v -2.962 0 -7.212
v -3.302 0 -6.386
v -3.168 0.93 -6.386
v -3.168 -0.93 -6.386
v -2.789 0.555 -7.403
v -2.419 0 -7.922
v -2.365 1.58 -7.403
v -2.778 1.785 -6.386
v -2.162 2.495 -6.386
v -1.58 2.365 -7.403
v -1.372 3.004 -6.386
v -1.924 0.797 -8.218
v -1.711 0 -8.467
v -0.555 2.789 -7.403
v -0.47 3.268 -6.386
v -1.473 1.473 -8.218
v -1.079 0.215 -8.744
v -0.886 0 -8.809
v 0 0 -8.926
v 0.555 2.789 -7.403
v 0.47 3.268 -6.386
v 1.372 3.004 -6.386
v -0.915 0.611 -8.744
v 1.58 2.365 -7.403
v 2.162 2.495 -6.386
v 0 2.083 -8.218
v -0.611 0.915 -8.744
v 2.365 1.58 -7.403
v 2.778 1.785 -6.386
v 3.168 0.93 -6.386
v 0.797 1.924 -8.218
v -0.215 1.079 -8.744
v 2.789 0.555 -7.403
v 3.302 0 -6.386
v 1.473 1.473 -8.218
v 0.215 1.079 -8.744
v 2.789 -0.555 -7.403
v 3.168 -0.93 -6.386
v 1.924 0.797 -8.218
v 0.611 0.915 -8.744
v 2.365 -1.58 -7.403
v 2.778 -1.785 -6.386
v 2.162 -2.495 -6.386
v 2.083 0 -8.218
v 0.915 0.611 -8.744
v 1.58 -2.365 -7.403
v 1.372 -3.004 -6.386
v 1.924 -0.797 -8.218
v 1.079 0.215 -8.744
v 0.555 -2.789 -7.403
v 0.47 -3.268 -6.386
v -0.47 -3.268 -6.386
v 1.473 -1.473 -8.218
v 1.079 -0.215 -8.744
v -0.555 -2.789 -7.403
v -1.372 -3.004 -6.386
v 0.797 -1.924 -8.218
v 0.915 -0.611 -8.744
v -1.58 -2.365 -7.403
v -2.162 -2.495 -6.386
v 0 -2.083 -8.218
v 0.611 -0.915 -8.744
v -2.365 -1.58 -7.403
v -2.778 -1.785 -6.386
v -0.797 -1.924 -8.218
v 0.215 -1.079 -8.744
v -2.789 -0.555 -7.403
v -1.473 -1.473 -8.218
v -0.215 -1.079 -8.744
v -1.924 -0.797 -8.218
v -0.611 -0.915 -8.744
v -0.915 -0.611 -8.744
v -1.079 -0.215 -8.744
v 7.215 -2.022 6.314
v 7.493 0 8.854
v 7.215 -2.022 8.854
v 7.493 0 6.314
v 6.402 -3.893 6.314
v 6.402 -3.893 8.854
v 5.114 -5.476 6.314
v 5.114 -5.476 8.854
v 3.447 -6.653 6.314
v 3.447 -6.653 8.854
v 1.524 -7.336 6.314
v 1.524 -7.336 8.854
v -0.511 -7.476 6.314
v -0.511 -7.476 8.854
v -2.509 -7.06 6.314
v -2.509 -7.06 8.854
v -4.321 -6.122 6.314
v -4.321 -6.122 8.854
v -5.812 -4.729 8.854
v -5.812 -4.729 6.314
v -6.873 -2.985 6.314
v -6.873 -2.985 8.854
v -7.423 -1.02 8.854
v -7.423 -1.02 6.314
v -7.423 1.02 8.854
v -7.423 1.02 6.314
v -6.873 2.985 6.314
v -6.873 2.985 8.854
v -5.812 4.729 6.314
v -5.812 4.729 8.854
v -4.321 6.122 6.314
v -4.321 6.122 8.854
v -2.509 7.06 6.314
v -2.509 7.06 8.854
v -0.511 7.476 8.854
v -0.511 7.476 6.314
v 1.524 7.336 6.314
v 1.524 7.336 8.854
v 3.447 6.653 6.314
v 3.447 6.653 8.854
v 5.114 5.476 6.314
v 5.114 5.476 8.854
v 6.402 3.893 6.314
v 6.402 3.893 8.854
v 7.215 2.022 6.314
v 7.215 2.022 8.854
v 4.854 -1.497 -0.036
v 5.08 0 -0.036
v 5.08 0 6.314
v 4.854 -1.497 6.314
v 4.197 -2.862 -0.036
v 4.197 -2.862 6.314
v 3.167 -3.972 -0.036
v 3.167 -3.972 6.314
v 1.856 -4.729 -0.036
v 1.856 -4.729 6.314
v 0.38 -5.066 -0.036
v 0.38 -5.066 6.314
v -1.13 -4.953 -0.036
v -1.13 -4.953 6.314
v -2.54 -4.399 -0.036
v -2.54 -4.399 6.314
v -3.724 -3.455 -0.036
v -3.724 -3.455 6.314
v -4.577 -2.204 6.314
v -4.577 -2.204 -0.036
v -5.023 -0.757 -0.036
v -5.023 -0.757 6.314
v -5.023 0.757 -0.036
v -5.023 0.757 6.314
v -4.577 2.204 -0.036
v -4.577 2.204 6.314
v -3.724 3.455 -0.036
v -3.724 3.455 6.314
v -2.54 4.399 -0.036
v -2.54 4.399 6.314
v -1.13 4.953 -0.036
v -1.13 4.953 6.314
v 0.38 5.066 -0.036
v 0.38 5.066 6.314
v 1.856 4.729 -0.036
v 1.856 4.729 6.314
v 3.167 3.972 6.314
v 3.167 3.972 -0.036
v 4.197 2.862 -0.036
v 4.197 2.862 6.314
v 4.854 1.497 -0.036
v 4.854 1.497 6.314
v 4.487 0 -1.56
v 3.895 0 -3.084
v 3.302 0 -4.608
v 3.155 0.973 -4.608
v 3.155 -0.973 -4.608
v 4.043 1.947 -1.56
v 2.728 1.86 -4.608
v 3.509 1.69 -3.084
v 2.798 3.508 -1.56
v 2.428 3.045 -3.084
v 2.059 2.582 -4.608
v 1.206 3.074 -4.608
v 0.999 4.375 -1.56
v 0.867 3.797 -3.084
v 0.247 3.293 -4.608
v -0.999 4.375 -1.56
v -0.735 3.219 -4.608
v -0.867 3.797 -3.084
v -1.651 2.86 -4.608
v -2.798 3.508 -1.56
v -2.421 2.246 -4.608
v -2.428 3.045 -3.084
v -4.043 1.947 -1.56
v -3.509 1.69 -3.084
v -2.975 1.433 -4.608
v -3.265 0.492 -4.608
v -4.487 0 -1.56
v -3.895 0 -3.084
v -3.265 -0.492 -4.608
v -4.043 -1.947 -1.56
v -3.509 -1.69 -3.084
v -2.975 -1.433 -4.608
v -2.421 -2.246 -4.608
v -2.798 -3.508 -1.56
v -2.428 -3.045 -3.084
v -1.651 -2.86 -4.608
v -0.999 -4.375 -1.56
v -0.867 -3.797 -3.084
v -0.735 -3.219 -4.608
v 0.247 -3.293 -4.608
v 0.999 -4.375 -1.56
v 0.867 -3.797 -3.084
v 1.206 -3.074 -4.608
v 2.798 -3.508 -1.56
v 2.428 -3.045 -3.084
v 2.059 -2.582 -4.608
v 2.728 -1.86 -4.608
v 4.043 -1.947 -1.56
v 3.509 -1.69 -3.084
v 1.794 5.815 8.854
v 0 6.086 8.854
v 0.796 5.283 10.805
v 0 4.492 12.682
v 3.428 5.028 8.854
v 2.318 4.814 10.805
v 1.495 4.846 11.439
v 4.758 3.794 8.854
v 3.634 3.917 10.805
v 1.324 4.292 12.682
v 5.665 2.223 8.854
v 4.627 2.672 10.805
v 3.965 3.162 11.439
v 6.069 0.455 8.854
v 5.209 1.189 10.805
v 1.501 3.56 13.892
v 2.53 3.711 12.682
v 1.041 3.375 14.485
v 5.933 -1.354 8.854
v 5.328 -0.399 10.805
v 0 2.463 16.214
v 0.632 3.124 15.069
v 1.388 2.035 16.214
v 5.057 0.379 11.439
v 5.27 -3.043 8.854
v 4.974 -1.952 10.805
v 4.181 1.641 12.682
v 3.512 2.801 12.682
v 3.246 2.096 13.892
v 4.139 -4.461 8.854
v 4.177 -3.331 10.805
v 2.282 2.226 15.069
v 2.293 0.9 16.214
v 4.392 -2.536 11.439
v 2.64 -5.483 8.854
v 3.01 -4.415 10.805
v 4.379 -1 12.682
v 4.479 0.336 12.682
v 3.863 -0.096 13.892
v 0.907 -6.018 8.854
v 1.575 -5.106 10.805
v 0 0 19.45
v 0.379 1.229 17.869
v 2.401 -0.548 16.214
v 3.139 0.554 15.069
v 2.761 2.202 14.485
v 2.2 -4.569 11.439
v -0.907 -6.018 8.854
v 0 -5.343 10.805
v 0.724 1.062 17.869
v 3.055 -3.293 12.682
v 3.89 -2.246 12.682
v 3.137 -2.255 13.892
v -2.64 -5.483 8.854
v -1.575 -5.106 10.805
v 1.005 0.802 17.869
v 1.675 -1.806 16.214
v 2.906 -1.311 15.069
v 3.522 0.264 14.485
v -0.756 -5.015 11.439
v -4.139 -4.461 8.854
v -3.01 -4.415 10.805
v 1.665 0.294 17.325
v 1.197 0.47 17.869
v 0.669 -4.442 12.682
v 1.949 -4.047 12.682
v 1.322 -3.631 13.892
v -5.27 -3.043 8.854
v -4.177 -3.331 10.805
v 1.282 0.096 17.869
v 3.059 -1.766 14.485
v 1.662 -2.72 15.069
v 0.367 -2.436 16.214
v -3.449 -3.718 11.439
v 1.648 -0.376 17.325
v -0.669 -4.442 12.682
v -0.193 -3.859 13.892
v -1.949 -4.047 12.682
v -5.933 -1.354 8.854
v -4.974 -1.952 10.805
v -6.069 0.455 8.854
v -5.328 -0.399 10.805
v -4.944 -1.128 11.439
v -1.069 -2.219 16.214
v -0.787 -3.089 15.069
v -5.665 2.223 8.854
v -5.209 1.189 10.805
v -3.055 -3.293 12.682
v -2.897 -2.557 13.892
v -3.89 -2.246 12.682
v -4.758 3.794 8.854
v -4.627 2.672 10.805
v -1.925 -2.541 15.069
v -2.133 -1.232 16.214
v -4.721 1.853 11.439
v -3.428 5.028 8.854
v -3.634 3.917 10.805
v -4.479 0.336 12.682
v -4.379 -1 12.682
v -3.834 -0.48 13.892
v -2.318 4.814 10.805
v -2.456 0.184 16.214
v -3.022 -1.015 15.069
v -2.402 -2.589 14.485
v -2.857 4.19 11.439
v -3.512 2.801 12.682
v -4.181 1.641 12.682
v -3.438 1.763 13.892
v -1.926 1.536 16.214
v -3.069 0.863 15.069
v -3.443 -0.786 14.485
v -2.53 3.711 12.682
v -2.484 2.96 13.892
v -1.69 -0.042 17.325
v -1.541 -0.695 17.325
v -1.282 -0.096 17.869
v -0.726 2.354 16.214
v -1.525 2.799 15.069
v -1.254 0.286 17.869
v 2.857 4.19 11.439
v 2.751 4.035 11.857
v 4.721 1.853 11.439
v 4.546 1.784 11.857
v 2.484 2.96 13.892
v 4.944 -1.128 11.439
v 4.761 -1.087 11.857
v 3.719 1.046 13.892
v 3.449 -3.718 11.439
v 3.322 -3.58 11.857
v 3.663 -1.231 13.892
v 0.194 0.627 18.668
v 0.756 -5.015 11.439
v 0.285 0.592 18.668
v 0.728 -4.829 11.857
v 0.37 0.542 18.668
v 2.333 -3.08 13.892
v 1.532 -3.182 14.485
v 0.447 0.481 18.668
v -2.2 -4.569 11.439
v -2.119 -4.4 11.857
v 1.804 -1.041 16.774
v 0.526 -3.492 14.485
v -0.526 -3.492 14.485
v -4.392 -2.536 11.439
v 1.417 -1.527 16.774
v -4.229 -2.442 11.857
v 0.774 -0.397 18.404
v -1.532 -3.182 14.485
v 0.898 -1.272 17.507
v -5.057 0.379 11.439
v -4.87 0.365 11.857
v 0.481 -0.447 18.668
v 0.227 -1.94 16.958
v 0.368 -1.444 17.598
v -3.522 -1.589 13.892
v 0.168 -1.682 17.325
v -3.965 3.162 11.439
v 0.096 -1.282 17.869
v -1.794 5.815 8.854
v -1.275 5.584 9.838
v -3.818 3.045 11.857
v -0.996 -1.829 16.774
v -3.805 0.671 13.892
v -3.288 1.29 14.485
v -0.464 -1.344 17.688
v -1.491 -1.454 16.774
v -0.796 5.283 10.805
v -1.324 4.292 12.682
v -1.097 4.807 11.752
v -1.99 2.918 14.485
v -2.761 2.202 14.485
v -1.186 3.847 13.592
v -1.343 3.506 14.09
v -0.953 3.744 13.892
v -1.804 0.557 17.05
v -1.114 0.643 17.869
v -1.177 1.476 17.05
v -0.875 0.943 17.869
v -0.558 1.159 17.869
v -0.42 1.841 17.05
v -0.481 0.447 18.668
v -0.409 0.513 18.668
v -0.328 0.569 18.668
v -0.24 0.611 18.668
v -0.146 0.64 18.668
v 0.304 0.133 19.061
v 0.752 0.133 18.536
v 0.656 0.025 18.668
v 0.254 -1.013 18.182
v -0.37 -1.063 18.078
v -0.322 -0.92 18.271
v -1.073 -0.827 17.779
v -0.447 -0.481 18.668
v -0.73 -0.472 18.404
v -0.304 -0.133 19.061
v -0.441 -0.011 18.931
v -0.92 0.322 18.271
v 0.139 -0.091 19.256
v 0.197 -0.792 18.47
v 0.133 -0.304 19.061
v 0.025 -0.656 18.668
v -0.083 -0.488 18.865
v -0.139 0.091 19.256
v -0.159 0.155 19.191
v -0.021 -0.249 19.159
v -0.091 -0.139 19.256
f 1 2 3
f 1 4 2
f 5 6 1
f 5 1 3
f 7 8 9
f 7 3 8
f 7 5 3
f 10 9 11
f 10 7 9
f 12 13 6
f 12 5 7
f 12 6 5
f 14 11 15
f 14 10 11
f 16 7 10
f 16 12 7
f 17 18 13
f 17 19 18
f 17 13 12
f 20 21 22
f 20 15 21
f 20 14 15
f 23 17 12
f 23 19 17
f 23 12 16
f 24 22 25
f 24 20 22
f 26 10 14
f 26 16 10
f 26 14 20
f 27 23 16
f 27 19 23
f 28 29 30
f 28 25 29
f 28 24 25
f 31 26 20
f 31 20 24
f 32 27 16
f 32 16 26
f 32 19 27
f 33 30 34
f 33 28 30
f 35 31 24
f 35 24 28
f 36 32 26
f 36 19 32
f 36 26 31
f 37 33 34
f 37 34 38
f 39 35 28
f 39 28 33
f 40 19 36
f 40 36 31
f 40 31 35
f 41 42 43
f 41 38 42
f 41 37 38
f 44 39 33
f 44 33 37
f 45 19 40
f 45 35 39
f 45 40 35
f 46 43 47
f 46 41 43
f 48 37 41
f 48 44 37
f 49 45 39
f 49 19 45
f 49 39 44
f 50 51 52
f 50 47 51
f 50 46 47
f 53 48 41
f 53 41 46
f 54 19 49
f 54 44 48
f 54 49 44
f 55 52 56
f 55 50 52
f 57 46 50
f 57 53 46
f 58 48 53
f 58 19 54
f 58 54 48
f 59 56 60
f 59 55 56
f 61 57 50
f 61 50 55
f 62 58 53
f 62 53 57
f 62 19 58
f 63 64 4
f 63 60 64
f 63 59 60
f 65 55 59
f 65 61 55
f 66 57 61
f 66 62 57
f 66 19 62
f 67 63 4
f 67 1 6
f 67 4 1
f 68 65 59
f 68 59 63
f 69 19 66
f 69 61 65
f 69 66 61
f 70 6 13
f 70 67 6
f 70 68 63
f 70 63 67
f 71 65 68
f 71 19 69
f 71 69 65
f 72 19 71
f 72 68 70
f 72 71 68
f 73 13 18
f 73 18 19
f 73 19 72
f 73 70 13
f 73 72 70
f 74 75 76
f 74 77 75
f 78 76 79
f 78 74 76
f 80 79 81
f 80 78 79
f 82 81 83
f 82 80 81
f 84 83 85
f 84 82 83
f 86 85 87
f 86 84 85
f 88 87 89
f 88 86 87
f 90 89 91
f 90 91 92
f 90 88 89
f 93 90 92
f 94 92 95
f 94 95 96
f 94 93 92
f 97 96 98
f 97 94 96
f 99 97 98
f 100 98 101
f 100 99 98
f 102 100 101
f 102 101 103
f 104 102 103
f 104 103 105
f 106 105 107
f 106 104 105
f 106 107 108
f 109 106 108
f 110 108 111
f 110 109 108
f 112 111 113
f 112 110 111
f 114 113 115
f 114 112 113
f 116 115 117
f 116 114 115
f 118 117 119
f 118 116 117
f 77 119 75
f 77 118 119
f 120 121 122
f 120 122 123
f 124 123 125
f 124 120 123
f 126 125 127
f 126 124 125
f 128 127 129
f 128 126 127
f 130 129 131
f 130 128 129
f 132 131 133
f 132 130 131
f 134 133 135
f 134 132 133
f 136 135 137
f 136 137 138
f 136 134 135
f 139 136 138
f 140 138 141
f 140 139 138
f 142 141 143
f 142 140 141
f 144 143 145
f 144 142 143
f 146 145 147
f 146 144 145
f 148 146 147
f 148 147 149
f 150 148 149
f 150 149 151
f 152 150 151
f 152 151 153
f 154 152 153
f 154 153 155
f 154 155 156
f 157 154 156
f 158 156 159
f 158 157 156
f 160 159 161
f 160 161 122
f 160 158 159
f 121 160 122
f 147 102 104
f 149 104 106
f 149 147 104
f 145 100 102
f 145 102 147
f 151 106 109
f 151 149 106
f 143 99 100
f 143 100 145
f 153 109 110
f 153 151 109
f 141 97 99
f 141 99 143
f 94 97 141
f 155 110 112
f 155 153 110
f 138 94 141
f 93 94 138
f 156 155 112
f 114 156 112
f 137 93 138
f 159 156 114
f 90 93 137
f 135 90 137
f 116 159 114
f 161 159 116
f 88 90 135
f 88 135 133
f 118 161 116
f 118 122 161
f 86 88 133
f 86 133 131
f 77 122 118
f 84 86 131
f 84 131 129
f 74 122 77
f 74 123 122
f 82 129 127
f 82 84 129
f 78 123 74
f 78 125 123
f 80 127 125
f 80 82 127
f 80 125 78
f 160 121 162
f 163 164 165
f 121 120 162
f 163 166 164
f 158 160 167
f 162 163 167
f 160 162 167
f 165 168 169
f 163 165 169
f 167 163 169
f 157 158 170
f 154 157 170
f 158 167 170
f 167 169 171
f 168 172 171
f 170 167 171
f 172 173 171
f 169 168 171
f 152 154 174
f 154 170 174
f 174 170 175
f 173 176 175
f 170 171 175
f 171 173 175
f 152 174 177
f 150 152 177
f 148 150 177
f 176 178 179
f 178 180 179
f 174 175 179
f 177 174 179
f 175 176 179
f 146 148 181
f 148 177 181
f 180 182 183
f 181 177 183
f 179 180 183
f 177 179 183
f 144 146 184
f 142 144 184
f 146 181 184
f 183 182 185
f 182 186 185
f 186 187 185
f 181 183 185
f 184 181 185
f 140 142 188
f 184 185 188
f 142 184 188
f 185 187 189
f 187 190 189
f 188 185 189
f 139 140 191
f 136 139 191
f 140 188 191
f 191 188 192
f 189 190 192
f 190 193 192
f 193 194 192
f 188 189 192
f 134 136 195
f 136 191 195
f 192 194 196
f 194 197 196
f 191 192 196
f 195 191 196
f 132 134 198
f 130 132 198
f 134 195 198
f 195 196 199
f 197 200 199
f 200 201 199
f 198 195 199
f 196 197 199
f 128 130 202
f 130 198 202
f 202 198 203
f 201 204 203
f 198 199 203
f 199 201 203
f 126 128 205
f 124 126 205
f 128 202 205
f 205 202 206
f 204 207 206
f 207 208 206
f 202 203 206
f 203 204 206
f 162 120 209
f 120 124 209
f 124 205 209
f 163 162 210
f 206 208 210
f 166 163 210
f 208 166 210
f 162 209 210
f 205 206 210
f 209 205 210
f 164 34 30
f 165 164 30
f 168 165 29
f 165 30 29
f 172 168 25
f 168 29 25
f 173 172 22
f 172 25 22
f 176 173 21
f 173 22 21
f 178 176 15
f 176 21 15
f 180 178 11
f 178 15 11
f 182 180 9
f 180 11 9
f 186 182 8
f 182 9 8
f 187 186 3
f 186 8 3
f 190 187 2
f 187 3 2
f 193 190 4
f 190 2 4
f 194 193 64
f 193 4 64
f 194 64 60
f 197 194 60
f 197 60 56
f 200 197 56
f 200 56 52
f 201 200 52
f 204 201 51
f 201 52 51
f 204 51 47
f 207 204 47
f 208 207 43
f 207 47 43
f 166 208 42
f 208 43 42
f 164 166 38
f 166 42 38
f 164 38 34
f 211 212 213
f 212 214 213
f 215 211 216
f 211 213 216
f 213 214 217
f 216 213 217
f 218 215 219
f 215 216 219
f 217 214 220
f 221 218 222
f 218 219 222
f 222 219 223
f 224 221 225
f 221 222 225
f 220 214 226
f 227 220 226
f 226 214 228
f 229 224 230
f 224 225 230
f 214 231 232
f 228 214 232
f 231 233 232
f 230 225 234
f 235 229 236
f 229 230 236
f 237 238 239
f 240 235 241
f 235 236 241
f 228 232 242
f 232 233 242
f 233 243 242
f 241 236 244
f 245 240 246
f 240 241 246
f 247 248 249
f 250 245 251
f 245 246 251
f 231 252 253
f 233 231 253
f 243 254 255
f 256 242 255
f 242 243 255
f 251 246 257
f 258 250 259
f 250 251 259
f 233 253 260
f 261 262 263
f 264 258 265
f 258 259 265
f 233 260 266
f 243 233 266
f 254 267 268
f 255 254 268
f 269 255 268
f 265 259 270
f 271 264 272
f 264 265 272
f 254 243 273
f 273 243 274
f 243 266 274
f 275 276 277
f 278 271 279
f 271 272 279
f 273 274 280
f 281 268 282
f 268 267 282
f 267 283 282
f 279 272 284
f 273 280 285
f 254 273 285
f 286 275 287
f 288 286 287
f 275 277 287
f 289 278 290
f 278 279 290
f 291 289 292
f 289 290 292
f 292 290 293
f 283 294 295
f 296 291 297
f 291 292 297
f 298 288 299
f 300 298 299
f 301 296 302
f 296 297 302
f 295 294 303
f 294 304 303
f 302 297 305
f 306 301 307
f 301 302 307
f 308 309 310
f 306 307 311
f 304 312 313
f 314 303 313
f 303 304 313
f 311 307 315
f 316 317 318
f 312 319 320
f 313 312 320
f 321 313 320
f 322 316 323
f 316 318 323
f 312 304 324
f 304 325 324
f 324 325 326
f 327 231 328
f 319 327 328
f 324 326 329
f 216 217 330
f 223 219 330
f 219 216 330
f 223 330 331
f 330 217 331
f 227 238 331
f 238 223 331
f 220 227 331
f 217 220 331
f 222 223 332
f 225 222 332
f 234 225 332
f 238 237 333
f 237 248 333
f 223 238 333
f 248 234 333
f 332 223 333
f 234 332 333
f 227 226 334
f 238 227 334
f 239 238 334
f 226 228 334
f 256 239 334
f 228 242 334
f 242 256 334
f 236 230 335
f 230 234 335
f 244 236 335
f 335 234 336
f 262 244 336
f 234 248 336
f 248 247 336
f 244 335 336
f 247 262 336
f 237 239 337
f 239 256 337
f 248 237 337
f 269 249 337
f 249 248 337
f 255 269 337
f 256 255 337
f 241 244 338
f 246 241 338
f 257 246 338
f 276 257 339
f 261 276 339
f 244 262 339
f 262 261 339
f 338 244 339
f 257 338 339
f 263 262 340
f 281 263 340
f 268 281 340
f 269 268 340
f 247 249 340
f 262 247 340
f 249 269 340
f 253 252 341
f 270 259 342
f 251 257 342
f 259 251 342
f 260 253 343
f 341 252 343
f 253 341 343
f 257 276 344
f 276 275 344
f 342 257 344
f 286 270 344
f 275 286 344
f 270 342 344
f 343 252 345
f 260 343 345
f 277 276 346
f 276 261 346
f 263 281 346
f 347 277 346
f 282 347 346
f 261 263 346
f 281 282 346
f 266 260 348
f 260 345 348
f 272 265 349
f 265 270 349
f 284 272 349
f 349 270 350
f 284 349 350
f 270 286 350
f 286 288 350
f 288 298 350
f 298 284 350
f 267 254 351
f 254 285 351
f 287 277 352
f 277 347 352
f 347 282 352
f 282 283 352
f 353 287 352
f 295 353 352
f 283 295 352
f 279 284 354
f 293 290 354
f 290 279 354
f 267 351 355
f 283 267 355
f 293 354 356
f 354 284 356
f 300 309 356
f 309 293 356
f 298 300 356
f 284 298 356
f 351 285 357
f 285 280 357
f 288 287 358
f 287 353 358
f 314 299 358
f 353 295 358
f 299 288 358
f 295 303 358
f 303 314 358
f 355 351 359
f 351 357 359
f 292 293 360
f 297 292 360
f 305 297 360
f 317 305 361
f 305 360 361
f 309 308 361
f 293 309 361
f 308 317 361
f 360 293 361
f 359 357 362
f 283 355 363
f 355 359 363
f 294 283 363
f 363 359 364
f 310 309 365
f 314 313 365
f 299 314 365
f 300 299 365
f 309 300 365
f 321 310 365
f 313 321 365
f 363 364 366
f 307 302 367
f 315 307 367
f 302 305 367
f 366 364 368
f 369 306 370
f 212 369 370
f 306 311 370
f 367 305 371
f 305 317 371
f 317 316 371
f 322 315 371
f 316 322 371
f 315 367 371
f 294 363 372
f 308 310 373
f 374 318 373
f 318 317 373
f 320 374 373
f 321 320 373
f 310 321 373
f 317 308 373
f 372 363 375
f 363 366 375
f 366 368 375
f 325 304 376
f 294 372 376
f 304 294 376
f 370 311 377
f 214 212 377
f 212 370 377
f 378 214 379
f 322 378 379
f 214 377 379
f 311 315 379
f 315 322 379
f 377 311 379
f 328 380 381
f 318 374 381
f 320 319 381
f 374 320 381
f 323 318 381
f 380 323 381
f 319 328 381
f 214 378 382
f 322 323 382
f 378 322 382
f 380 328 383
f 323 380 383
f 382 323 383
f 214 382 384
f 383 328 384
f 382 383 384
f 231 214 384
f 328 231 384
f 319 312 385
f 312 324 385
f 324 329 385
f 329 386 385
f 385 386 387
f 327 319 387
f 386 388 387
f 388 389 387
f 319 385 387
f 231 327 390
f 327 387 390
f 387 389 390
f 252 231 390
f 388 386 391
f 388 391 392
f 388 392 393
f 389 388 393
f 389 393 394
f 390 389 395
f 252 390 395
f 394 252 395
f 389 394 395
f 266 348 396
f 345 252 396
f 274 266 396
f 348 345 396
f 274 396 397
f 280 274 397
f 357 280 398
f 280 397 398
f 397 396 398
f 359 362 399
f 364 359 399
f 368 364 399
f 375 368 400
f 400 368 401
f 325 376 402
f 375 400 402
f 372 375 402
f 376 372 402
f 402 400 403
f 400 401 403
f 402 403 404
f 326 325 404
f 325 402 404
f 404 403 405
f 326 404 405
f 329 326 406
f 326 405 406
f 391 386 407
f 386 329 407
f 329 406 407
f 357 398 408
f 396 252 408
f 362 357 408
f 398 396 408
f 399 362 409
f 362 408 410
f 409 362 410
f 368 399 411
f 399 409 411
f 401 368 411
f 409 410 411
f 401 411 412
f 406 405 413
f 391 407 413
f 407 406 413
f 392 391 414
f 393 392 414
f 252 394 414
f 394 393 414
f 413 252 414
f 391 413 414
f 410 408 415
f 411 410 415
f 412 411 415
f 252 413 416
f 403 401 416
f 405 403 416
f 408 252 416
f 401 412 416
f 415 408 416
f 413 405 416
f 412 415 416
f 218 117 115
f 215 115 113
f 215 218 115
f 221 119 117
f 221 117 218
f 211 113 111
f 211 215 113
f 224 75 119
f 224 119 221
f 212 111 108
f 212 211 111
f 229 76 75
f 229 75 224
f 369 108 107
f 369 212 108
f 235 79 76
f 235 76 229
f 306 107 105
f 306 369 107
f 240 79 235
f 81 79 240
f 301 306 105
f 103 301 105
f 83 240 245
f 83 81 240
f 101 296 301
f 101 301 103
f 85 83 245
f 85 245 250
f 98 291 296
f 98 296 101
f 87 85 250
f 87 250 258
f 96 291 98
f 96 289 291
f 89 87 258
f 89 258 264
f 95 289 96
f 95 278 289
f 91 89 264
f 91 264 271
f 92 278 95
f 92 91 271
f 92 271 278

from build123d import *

# Parameters (mm, degrees)
DOME1_FACE_RADIUS = 3.302
DOME1_HEIGHT      = 2.54


# Read off the part's stored shape, not the designer's step: Cut-Revolve-Thin7
with BuildPart() as part:
    # Sketch2 → Revolve1 (revolve)
    with BuildSketch(Plane(origin=(0, 0, 0), x_dir=(0, 0, -1), z_dir=(1, 0, 0)), mode=Mode.PRIVATE) as revolve1_sk:
        Polygon((-8.853714286, 0), (-8.853714286, 7.493), (-6.313714286, 7.493), (-6.313714286, 5.08), (6.386285714, 5.08), (6.386285714, 0), align=None)
    revolve(revolve1_sk.sketch.rotate(Axis((0, 0, 17.845728077), (0, 0, -1)), 90), axis=Axis((0, 0, 17.845728077), (0, 0, -1)))

    # Sketch3 → Revolve2 (revolve)
    with BuildSketch(Plane(origin=(0, 0, 0), x_dir=(0, 0, -1), z_dir=(1, 0, 0))):
        with BuildLine():
            Line((-19.449560173, 0), (-8.853714286, 0))
            Line((-8.853714286, 0), (-8.853714286, 6.085655059))
            add(Edge.make_bspline(
                [(-8.853714286, 6.085655059), (-14.817702659, 4.020762633), (-19.449560173, 0)],
                knots=[0, 0, 0, 1, 1, 1], degree=2))
        make_face()
    revolve(axis=Axis((0, 0, 19.449560173), (0, 0, -1)))

    # Cut-Revolve-Thin7 outline → Cut-Revolve-Thin7 (revolve, cut)
    with BuildSketch(Plane.XZ):
        Polygon((5.08, -0.036285714), (3.302, -4.608285714), (3.302, -6.386285714), (5.08, -6.386285714), align=None)
    revolve(axis=Axis((0, 0, 0), (0, 0, 1)), mode=Mode.SUBTRACT)

    # Dome1: a dome of height H over a round flat face of radius A is a cap of a sphere of radius (A * A + H * H) / (2 * H)
    dome1_r = (DOME1_FACE_RADIUS * DOME1_FACE_RADIUS + DOME1_HEIGHT * DOME1_HEIGHT) / (2 * DOME1_HEIGHT)
    dome1_base = Plane((0, 0, -6.386285714), z_dir=(0, 0, -1))
    with Locations(dome1_base.offset(DOME1_HEIGHT - dome1_r)):
        dome1_ball = Sphere(dome1_r, mode=Mode.PRIVATE)
    add(split(dome1_ball, bisect_by=dome1_base, keep=Keep.TOP, mode=Mode.PRIVATE))


solid = part.part
